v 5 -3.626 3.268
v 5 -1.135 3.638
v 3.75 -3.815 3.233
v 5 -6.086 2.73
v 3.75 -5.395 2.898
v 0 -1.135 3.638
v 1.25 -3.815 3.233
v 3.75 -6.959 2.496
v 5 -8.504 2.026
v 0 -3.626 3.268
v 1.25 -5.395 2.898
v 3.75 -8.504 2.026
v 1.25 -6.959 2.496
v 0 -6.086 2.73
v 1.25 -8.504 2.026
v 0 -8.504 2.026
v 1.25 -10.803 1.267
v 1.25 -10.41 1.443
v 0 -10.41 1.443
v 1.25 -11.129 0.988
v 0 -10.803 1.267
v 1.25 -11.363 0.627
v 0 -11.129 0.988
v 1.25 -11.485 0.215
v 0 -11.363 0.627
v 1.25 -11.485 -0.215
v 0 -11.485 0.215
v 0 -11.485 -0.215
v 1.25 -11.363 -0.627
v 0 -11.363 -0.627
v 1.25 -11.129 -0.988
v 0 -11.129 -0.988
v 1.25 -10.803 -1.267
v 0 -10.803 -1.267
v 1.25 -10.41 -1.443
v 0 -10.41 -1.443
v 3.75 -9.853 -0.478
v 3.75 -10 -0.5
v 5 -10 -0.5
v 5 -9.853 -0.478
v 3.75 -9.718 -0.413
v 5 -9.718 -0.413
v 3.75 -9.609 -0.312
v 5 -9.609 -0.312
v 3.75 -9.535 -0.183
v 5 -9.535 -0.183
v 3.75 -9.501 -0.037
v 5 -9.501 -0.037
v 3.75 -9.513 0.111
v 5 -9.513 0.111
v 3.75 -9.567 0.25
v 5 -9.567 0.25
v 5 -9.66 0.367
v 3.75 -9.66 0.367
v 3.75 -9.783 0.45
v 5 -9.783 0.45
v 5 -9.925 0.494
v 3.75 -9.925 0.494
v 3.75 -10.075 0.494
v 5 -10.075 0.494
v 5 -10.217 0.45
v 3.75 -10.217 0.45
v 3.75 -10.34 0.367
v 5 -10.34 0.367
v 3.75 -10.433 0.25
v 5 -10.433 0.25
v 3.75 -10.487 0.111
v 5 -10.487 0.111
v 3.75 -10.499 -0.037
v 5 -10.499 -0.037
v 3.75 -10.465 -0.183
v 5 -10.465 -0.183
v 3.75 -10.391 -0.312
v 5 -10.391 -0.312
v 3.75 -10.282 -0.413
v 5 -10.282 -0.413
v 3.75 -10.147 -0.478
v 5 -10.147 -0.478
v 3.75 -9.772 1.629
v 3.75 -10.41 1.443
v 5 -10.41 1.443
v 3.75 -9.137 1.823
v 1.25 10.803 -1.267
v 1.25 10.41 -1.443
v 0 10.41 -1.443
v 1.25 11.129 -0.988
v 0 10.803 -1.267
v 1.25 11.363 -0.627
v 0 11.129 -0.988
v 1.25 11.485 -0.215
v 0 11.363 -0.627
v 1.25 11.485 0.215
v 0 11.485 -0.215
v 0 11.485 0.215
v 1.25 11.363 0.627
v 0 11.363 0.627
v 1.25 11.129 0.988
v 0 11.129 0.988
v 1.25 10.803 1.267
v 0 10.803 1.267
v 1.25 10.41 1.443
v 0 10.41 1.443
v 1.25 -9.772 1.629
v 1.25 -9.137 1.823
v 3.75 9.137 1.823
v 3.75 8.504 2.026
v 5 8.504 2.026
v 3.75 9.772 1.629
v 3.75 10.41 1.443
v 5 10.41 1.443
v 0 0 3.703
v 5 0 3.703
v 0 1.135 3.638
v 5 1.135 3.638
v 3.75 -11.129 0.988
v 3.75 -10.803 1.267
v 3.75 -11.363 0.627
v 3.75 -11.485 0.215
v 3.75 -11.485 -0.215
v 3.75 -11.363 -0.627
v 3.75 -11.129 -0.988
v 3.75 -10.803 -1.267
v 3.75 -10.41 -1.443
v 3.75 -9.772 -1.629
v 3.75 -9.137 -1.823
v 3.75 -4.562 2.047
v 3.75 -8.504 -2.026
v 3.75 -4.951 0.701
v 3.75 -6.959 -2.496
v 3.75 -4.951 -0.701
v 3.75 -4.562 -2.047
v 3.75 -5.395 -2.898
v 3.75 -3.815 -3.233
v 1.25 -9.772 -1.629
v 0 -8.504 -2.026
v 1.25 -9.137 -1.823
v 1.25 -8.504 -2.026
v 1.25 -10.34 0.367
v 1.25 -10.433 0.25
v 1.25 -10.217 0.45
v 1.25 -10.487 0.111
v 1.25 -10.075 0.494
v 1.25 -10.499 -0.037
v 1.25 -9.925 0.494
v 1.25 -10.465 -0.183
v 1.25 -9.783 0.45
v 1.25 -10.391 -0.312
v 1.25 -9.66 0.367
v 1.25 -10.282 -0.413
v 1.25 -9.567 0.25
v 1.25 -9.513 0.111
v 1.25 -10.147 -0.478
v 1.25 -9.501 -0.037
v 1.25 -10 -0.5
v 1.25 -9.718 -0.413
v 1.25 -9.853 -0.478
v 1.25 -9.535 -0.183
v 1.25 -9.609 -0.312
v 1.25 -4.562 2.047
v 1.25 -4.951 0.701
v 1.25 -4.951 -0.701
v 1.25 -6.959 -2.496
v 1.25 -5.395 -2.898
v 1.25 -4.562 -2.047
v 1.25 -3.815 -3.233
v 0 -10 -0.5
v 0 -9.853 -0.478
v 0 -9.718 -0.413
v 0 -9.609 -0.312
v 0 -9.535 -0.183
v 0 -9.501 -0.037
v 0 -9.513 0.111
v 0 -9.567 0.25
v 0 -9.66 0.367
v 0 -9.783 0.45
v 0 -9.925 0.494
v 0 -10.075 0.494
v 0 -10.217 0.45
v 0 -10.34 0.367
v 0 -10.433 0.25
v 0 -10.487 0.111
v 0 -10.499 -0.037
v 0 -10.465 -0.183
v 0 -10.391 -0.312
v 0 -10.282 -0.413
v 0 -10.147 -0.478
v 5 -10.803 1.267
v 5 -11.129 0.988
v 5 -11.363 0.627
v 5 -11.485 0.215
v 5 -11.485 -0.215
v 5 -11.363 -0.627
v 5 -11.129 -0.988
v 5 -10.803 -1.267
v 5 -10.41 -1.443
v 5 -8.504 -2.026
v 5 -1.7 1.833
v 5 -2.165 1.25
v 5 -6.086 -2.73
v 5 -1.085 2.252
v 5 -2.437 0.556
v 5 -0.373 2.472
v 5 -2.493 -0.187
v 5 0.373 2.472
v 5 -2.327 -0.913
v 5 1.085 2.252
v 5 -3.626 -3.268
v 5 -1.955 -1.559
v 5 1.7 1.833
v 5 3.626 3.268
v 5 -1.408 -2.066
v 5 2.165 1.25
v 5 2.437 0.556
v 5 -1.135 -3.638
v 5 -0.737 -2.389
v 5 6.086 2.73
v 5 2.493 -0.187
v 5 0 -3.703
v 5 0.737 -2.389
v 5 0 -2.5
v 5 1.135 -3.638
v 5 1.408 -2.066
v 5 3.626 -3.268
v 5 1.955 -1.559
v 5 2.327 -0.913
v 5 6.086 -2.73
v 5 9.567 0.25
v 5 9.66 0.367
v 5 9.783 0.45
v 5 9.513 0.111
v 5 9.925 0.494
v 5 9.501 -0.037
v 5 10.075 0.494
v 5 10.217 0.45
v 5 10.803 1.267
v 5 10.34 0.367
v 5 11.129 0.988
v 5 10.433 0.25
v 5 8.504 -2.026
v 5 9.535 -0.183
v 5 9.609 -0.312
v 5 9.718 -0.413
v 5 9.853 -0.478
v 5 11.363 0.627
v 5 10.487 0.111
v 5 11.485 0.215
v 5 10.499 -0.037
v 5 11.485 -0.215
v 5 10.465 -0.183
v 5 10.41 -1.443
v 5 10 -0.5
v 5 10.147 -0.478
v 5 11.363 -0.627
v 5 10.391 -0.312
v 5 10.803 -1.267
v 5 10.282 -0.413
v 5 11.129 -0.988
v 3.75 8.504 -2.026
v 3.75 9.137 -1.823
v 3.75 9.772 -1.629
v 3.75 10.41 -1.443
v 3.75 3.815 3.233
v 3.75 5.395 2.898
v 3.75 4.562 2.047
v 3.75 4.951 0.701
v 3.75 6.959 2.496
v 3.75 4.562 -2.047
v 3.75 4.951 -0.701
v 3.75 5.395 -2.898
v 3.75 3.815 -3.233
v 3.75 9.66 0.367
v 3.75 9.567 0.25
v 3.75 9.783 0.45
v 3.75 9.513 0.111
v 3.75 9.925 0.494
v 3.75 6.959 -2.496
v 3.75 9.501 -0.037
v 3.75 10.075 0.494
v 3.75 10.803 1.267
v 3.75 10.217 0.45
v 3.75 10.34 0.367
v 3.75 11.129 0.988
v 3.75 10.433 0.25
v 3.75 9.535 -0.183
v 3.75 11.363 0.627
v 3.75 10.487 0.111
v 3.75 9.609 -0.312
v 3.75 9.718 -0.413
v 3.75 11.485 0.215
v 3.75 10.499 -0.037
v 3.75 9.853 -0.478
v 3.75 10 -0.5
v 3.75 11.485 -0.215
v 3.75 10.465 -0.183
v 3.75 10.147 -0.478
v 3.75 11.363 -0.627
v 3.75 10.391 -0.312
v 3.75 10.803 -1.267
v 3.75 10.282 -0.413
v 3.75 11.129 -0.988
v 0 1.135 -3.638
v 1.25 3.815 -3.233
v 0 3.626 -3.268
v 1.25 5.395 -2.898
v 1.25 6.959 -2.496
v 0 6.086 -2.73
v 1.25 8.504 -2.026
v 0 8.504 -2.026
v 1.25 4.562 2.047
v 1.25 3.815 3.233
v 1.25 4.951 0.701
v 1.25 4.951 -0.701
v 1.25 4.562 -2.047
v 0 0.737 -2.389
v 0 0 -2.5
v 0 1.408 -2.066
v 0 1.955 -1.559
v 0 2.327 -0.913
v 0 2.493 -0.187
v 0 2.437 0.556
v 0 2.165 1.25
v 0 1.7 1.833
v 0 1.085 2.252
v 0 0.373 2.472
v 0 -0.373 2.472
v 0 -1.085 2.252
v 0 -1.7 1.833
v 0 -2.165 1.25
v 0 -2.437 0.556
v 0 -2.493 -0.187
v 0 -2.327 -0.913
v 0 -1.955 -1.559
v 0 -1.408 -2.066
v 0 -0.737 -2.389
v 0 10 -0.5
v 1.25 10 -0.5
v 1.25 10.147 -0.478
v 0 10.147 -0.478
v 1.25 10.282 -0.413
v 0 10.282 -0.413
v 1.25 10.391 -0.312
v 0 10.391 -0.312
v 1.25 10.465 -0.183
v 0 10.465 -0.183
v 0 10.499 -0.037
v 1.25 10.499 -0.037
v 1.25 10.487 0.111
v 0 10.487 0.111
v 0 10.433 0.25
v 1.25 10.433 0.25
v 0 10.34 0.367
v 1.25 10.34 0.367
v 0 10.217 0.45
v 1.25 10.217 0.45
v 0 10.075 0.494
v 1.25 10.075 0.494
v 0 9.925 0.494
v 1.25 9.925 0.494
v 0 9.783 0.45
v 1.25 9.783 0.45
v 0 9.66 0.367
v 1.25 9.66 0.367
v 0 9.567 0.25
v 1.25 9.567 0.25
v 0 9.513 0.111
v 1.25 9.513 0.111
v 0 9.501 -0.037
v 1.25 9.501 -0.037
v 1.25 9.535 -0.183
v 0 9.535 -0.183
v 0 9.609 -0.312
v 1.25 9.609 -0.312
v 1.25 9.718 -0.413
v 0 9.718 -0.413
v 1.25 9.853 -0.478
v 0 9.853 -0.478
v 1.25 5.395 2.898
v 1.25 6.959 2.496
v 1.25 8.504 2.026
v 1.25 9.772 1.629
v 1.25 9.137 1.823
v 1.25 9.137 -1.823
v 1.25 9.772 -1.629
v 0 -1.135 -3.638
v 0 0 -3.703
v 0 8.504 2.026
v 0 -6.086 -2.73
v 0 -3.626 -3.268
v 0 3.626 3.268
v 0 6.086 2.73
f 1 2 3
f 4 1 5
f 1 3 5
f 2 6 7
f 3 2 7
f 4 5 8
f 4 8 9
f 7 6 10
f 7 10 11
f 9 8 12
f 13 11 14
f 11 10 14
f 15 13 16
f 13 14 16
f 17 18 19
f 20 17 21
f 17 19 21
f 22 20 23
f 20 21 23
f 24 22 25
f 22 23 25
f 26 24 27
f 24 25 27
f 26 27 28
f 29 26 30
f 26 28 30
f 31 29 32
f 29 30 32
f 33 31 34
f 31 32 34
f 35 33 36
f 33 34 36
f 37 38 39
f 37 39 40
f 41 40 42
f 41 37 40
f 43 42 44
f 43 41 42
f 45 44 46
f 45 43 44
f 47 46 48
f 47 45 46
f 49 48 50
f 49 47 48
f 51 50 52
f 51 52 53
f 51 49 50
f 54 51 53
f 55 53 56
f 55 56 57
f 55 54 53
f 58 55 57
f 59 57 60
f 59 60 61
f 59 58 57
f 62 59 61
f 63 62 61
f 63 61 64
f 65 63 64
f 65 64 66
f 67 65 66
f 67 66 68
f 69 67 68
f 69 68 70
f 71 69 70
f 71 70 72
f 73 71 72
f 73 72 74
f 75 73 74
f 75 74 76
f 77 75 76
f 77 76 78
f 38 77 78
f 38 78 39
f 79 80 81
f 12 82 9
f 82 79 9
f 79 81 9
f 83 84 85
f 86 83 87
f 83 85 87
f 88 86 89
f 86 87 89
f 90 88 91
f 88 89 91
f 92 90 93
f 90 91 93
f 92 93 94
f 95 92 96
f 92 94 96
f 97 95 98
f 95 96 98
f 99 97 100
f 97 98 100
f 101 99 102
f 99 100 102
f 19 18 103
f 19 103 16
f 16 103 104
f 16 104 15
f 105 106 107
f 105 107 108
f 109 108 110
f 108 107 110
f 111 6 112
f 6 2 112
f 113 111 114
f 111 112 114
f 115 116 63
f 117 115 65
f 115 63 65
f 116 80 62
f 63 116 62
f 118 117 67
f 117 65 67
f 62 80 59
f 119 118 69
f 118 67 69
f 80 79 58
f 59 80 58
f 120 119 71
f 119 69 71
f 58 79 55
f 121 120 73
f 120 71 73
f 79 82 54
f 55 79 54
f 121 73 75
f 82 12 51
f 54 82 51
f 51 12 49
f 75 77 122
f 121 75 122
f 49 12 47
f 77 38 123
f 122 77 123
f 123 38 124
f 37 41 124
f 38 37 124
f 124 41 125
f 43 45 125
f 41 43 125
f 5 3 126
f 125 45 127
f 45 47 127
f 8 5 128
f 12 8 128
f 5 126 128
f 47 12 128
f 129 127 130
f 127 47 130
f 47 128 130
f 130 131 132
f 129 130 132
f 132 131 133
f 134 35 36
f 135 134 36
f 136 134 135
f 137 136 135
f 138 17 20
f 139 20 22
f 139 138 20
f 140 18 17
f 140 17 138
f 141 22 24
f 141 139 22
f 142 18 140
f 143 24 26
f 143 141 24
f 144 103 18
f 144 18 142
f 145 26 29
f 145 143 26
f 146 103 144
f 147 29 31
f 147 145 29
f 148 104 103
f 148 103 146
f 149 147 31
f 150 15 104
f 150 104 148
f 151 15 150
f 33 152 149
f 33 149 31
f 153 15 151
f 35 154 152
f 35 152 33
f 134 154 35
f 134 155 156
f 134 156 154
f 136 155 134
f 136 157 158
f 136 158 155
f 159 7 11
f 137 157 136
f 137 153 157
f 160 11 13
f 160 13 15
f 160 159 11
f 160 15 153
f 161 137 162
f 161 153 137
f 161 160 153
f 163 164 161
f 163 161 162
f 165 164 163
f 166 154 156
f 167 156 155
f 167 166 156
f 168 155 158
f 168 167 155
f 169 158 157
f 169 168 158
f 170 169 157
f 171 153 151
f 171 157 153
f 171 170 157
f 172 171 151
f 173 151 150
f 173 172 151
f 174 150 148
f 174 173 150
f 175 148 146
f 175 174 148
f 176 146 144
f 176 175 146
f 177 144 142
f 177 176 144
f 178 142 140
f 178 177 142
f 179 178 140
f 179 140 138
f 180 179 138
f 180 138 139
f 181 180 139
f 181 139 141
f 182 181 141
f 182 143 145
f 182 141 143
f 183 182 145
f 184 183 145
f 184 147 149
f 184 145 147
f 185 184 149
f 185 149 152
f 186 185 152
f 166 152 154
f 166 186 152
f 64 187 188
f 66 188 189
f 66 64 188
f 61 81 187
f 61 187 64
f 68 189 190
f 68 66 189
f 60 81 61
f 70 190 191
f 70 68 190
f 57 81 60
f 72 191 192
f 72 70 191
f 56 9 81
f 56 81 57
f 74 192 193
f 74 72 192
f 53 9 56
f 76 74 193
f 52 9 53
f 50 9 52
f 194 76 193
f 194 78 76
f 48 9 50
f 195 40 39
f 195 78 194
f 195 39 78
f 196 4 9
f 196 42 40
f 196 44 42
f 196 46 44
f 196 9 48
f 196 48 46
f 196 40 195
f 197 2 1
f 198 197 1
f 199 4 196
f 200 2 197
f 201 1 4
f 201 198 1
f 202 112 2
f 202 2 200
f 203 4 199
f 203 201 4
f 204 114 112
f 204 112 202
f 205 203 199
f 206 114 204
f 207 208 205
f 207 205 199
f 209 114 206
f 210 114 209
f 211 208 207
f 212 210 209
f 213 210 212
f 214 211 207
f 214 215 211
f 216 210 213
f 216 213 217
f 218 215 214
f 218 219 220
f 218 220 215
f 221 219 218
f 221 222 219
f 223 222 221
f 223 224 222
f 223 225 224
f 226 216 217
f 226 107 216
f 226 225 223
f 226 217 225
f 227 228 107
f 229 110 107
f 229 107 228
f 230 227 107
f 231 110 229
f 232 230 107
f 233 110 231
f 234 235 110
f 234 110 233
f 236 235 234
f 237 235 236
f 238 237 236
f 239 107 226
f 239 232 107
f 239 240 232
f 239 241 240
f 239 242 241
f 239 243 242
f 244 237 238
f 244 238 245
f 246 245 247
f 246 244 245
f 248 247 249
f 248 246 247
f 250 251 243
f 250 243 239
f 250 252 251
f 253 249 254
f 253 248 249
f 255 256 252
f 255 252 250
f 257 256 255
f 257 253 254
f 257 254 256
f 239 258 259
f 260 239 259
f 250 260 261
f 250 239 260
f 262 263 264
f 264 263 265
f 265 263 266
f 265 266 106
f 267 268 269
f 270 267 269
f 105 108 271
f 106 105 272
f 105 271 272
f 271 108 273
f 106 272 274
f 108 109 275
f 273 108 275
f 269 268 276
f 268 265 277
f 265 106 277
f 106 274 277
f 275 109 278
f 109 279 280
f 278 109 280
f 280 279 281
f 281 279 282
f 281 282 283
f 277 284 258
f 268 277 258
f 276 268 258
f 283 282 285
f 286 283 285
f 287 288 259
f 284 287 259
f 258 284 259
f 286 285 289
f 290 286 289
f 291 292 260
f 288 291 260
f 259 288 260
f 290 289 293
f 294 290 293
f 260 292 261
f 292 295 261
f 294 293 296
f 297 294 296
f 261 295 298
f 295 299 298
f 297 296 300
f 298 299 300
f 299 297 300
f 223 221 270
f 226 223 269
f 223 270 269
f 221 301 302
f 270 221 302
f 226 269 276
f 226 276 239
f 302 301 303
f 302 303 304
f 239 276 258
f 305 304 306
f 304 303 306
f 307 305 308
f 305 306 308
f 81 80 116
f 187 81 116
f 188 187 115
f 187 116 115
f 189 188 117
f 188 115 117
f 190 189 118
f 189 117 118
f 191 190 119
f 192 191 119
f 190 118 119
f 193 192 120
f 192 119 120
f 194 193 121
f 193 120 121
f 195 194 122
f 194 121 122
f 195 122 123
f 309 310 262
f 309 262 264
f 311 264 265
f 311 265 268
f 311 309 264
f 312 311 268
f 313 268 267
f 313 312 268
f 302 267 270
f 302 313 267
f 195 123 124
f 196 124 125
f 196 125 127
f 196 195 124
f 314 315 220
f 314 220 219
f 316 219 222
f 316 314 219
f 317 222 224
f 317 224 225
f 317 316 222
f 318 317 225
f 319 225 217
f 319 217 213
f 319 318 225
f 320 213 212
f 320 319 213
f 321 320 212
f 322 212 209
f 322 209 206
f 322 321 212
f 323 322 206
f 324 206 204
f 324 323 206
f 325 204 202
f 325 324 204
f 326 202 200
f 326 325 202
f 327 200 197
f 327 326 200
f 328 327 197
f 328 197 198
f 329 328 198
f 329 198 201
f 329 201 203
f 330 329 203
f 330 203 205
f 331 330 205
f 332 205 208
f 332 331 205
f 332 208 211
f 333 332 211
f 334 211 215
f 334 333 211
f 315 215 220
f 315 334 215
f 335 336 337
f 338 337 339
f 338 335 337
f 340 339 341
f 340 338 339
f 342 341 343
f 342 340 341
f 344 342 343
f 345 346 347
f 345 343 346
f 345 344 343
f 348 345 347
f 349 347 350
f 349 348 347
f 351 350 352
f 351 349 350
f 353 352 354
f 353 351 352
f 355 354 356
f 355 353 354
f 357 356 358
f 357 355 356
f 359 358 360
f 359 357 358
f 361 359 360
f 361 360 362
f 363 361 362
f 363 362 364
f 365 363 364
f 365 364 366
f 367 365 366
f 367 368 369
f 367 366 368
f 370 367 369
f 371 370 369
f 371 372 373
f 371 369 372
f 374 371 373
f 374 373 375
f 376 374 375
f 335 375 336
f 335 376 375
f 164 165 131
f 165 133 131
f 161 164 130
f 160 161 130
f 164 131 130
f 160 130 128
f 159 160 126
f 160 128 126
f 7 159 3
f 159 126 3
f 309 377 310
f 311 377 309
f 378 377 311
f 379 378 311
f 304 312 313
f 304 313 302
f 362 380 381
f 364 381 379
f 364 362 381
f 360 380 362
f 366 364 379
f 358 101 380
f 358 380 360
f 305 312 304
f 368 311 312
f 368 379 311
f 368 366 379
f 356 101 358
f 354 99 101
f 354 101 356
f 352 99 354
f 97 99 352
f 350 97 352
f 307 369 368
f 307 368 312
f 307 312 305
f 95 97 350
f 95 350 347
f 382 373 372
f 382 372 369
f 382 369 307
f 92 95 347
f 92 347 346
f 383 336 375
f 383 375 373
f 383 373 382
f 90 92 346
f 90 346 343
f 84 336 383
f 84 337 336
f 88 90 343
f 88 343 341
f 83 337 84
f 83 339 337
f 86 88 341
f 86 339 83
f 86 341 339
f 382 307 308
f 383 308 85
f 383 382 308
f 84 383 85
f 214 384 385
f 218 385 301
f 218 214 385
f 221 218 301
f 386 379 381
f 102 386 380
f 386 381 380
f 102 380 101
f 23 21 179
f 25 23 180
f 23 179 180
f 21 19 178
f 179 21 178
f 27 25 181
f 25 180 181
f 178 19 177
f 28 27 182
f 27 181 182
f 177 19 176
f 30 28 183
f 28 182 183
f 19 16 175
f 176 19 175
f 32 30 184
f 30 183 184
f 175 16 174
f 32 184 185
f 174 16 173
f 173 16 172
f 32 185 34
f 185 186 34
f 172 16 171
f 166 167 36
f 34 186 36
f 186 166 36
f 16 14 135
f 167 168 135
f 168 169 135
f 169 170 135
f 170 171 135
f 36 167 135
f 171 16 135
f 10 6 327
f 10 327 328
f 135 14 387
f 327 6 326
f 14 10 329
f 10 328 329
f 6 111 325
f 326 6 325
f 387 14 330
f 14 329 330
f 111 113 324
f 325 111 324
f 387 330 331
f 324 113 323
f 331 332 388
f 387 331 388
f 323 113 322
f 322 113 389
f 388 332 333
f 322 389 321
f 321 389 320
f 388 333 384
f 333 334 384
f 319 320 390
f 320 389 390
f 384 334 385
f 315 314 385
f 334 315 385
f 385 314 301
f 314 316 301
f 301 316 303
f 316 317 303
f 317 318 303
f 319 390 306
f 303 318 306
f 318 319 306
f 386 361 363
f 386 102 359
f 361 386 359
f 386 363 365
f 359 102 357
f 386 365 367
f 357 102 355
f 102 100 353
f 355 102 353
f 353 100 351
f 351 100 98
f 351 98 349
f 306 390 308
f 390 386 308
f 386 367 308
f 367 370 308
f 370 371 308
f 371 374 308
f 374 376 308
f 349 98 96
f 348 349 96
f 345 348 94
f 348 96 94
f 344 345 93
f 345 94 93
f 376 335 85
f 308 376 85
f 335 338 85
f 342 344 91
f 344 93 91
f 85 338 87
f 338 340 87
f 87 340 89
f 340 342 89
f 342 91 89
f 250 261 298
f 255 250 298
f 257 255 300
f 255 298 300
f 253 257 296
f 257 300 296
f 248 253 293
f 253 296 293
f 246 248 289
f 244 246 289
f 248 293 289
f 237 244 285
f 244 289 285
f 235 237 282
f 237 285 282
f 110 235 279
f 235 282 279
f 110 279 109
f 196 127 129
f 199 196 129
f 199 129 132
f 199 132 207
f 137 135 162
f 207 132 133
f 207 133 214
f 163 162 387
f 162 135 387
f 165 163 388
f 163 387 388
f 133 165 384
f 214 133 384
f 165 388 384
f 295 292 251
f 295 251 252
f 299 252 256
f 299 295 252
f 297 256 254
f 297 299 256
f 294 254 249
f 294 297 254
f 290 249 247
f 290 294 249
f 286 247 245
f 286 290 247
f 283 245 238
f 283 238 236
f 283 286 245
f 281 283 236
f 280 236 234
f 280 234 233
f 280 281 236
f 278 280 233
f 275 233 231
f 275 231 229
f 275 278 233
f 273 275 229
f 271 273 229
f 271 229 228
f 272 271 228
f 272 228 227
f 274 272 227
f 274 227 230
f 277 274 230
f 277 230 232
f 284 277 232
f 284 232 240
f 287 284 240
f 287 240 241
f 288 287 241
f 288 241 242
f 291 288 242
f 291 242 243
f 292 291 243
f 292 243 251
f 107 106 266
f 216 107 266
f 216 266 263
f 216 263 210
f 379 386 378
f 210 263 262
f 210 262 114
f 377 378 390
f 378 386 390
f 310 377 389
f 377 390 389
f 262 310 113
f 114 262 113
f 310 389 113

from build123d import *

# Parameters (mm, degrees)
CROQUIS1_R              = 2.5
CROQUIS1_R_2            = 0.5
SALIENTE_EXTRUIR1_DEPTH = 5
REDONDEO1_R             = 50
REDONDEO2_R             = 10
CORTAR_EXTRUIR1_START   = -2.5
CORTAR_EXTRUIR1_DEPTH   = 1.25


with BuildPart() as part:
    # Croquis1 → Saliente-Extruir1 (new body)
    with BuildSketch(Plane(origin=(0, 0, 0), x_dir=(0, 0, -1), z_dir=(1, 0, 0))):
        with BuildLine():
            ThreePointArc((-1.5, -10), (0, -11.5), (1.5, -10))
            ThreePointArc((1.5, -10), (2.97123258, -5.077902331), (3.75, 0))
            ThreePointArc((3.75, 0), (2.97123258, 5.077902331), (1.5, 10))
            ThreePointArc((1.5, 10), (0, 11.5), (-1.5, 10))
            ThreePointArc((-1.5, 10), (-2.97123258, 5.077902331), (-3.75, 0))
            ThreePointArc((-3.75, 0), (-2.97123258, -5.077902331), (-1.5, -10))
        make_face()
        Circle(CROQUIS1_R, mode=Mode.SUBTRACT)
        with Locations((0, 10)):
            Circle(CROQUIS1_R_2, mode=Mode.SUBTRACT)
        with Locations((0, -10)):
            Circle(CROQUIS1_R_2, mode=Mode.SUBTRACT)
    extrude(amount=SALIENTE_EXTRUIR1_DEPTH)

    # Redondeo1
    redondeo1_edges = [part.edges().sort_by_distance(p)[0] for p in [
        (2.5, 10, 1.5),
        (2.5, 10, -1.5),
        (2.5, -10, -1.5),
        (2.5, -10, 1.5),
    ]]
    fillet(redondeo1_edges, radius=REDONDEO1_R)

    # Redondeo2
    redondeo2_edges = [part.edges().sort_by_distance(p)[0] for p in [
        (2.5, 0, -3.75),
        (2.5, 0, 3.75),
    ]]
    fillet(redondeo2_edges, radius=REDONDEO2_R)

    # Croquis2 → Cortar-Extruir1 (cut, symmetric)
    with BuildSketch(Plane.ZY.offset(CORTAR_EXTRUIR1_START)):
        with BuildLine():
            ThreePointArc((-3.232551289, -3.814526467), (0, -5), (3.232551289, -3.814526467))
            ThreePointArc((3.232551289, -3.814526467), (2.705759395, -6.179171669), (2.02610144, -8.504493518))
            ThreePointArc((2.02610144, -8.504493518), (1.724946708, -9.454502859), (1.442786447, -10.410325806))
            ThreePointArc((1.442786447, -10.410325806), (0, -11.5), (-1.442786447, -10.410325806))
            ThreePointArc((-1.442786447, -10.410325806), (-1.724946708, -9.454502859), (-2.02610144, -8.504493518))
            ThreePointArc((-2.02610144, -8.504493518), (-2.705759395, -6.179171669), (-3.232551289, -3.814526467))
        make_face()
        with BuildLine():
            ThreePointArc((3.232551289, 3.814526467), (0, 5), (-3.232551289, 3.814526467))
            ThreePointArc((-3.232551289, 3.814526467), (-2.705759395, 6.179171669), (-2.02610144, 8.504493518))
            ThreePointArc((-2.02610144, 8.504493518), (-1.724946708, 9.454502859), (-1.442786447, 10.410325806))
            ThreePointArc((-1.442786447, 10.410325806), (0, 11.5), (1.442786447, 10.410325806))
            ThreePointArc((1.442786447, 10.410325806), (1.724946708, 9.454502859), (2.02610144, 8.504493518))
            ThreePointArc((2.02610144, 8.504493518), (2.705759395, 6.179171669), (3.232551289, 3.814526467))
        make_face()
    extrude(amount=CORTAR_EXTRUIR1_DEPTH, both=True, mode=Mode.SUBTRACT)


solid = part.part
